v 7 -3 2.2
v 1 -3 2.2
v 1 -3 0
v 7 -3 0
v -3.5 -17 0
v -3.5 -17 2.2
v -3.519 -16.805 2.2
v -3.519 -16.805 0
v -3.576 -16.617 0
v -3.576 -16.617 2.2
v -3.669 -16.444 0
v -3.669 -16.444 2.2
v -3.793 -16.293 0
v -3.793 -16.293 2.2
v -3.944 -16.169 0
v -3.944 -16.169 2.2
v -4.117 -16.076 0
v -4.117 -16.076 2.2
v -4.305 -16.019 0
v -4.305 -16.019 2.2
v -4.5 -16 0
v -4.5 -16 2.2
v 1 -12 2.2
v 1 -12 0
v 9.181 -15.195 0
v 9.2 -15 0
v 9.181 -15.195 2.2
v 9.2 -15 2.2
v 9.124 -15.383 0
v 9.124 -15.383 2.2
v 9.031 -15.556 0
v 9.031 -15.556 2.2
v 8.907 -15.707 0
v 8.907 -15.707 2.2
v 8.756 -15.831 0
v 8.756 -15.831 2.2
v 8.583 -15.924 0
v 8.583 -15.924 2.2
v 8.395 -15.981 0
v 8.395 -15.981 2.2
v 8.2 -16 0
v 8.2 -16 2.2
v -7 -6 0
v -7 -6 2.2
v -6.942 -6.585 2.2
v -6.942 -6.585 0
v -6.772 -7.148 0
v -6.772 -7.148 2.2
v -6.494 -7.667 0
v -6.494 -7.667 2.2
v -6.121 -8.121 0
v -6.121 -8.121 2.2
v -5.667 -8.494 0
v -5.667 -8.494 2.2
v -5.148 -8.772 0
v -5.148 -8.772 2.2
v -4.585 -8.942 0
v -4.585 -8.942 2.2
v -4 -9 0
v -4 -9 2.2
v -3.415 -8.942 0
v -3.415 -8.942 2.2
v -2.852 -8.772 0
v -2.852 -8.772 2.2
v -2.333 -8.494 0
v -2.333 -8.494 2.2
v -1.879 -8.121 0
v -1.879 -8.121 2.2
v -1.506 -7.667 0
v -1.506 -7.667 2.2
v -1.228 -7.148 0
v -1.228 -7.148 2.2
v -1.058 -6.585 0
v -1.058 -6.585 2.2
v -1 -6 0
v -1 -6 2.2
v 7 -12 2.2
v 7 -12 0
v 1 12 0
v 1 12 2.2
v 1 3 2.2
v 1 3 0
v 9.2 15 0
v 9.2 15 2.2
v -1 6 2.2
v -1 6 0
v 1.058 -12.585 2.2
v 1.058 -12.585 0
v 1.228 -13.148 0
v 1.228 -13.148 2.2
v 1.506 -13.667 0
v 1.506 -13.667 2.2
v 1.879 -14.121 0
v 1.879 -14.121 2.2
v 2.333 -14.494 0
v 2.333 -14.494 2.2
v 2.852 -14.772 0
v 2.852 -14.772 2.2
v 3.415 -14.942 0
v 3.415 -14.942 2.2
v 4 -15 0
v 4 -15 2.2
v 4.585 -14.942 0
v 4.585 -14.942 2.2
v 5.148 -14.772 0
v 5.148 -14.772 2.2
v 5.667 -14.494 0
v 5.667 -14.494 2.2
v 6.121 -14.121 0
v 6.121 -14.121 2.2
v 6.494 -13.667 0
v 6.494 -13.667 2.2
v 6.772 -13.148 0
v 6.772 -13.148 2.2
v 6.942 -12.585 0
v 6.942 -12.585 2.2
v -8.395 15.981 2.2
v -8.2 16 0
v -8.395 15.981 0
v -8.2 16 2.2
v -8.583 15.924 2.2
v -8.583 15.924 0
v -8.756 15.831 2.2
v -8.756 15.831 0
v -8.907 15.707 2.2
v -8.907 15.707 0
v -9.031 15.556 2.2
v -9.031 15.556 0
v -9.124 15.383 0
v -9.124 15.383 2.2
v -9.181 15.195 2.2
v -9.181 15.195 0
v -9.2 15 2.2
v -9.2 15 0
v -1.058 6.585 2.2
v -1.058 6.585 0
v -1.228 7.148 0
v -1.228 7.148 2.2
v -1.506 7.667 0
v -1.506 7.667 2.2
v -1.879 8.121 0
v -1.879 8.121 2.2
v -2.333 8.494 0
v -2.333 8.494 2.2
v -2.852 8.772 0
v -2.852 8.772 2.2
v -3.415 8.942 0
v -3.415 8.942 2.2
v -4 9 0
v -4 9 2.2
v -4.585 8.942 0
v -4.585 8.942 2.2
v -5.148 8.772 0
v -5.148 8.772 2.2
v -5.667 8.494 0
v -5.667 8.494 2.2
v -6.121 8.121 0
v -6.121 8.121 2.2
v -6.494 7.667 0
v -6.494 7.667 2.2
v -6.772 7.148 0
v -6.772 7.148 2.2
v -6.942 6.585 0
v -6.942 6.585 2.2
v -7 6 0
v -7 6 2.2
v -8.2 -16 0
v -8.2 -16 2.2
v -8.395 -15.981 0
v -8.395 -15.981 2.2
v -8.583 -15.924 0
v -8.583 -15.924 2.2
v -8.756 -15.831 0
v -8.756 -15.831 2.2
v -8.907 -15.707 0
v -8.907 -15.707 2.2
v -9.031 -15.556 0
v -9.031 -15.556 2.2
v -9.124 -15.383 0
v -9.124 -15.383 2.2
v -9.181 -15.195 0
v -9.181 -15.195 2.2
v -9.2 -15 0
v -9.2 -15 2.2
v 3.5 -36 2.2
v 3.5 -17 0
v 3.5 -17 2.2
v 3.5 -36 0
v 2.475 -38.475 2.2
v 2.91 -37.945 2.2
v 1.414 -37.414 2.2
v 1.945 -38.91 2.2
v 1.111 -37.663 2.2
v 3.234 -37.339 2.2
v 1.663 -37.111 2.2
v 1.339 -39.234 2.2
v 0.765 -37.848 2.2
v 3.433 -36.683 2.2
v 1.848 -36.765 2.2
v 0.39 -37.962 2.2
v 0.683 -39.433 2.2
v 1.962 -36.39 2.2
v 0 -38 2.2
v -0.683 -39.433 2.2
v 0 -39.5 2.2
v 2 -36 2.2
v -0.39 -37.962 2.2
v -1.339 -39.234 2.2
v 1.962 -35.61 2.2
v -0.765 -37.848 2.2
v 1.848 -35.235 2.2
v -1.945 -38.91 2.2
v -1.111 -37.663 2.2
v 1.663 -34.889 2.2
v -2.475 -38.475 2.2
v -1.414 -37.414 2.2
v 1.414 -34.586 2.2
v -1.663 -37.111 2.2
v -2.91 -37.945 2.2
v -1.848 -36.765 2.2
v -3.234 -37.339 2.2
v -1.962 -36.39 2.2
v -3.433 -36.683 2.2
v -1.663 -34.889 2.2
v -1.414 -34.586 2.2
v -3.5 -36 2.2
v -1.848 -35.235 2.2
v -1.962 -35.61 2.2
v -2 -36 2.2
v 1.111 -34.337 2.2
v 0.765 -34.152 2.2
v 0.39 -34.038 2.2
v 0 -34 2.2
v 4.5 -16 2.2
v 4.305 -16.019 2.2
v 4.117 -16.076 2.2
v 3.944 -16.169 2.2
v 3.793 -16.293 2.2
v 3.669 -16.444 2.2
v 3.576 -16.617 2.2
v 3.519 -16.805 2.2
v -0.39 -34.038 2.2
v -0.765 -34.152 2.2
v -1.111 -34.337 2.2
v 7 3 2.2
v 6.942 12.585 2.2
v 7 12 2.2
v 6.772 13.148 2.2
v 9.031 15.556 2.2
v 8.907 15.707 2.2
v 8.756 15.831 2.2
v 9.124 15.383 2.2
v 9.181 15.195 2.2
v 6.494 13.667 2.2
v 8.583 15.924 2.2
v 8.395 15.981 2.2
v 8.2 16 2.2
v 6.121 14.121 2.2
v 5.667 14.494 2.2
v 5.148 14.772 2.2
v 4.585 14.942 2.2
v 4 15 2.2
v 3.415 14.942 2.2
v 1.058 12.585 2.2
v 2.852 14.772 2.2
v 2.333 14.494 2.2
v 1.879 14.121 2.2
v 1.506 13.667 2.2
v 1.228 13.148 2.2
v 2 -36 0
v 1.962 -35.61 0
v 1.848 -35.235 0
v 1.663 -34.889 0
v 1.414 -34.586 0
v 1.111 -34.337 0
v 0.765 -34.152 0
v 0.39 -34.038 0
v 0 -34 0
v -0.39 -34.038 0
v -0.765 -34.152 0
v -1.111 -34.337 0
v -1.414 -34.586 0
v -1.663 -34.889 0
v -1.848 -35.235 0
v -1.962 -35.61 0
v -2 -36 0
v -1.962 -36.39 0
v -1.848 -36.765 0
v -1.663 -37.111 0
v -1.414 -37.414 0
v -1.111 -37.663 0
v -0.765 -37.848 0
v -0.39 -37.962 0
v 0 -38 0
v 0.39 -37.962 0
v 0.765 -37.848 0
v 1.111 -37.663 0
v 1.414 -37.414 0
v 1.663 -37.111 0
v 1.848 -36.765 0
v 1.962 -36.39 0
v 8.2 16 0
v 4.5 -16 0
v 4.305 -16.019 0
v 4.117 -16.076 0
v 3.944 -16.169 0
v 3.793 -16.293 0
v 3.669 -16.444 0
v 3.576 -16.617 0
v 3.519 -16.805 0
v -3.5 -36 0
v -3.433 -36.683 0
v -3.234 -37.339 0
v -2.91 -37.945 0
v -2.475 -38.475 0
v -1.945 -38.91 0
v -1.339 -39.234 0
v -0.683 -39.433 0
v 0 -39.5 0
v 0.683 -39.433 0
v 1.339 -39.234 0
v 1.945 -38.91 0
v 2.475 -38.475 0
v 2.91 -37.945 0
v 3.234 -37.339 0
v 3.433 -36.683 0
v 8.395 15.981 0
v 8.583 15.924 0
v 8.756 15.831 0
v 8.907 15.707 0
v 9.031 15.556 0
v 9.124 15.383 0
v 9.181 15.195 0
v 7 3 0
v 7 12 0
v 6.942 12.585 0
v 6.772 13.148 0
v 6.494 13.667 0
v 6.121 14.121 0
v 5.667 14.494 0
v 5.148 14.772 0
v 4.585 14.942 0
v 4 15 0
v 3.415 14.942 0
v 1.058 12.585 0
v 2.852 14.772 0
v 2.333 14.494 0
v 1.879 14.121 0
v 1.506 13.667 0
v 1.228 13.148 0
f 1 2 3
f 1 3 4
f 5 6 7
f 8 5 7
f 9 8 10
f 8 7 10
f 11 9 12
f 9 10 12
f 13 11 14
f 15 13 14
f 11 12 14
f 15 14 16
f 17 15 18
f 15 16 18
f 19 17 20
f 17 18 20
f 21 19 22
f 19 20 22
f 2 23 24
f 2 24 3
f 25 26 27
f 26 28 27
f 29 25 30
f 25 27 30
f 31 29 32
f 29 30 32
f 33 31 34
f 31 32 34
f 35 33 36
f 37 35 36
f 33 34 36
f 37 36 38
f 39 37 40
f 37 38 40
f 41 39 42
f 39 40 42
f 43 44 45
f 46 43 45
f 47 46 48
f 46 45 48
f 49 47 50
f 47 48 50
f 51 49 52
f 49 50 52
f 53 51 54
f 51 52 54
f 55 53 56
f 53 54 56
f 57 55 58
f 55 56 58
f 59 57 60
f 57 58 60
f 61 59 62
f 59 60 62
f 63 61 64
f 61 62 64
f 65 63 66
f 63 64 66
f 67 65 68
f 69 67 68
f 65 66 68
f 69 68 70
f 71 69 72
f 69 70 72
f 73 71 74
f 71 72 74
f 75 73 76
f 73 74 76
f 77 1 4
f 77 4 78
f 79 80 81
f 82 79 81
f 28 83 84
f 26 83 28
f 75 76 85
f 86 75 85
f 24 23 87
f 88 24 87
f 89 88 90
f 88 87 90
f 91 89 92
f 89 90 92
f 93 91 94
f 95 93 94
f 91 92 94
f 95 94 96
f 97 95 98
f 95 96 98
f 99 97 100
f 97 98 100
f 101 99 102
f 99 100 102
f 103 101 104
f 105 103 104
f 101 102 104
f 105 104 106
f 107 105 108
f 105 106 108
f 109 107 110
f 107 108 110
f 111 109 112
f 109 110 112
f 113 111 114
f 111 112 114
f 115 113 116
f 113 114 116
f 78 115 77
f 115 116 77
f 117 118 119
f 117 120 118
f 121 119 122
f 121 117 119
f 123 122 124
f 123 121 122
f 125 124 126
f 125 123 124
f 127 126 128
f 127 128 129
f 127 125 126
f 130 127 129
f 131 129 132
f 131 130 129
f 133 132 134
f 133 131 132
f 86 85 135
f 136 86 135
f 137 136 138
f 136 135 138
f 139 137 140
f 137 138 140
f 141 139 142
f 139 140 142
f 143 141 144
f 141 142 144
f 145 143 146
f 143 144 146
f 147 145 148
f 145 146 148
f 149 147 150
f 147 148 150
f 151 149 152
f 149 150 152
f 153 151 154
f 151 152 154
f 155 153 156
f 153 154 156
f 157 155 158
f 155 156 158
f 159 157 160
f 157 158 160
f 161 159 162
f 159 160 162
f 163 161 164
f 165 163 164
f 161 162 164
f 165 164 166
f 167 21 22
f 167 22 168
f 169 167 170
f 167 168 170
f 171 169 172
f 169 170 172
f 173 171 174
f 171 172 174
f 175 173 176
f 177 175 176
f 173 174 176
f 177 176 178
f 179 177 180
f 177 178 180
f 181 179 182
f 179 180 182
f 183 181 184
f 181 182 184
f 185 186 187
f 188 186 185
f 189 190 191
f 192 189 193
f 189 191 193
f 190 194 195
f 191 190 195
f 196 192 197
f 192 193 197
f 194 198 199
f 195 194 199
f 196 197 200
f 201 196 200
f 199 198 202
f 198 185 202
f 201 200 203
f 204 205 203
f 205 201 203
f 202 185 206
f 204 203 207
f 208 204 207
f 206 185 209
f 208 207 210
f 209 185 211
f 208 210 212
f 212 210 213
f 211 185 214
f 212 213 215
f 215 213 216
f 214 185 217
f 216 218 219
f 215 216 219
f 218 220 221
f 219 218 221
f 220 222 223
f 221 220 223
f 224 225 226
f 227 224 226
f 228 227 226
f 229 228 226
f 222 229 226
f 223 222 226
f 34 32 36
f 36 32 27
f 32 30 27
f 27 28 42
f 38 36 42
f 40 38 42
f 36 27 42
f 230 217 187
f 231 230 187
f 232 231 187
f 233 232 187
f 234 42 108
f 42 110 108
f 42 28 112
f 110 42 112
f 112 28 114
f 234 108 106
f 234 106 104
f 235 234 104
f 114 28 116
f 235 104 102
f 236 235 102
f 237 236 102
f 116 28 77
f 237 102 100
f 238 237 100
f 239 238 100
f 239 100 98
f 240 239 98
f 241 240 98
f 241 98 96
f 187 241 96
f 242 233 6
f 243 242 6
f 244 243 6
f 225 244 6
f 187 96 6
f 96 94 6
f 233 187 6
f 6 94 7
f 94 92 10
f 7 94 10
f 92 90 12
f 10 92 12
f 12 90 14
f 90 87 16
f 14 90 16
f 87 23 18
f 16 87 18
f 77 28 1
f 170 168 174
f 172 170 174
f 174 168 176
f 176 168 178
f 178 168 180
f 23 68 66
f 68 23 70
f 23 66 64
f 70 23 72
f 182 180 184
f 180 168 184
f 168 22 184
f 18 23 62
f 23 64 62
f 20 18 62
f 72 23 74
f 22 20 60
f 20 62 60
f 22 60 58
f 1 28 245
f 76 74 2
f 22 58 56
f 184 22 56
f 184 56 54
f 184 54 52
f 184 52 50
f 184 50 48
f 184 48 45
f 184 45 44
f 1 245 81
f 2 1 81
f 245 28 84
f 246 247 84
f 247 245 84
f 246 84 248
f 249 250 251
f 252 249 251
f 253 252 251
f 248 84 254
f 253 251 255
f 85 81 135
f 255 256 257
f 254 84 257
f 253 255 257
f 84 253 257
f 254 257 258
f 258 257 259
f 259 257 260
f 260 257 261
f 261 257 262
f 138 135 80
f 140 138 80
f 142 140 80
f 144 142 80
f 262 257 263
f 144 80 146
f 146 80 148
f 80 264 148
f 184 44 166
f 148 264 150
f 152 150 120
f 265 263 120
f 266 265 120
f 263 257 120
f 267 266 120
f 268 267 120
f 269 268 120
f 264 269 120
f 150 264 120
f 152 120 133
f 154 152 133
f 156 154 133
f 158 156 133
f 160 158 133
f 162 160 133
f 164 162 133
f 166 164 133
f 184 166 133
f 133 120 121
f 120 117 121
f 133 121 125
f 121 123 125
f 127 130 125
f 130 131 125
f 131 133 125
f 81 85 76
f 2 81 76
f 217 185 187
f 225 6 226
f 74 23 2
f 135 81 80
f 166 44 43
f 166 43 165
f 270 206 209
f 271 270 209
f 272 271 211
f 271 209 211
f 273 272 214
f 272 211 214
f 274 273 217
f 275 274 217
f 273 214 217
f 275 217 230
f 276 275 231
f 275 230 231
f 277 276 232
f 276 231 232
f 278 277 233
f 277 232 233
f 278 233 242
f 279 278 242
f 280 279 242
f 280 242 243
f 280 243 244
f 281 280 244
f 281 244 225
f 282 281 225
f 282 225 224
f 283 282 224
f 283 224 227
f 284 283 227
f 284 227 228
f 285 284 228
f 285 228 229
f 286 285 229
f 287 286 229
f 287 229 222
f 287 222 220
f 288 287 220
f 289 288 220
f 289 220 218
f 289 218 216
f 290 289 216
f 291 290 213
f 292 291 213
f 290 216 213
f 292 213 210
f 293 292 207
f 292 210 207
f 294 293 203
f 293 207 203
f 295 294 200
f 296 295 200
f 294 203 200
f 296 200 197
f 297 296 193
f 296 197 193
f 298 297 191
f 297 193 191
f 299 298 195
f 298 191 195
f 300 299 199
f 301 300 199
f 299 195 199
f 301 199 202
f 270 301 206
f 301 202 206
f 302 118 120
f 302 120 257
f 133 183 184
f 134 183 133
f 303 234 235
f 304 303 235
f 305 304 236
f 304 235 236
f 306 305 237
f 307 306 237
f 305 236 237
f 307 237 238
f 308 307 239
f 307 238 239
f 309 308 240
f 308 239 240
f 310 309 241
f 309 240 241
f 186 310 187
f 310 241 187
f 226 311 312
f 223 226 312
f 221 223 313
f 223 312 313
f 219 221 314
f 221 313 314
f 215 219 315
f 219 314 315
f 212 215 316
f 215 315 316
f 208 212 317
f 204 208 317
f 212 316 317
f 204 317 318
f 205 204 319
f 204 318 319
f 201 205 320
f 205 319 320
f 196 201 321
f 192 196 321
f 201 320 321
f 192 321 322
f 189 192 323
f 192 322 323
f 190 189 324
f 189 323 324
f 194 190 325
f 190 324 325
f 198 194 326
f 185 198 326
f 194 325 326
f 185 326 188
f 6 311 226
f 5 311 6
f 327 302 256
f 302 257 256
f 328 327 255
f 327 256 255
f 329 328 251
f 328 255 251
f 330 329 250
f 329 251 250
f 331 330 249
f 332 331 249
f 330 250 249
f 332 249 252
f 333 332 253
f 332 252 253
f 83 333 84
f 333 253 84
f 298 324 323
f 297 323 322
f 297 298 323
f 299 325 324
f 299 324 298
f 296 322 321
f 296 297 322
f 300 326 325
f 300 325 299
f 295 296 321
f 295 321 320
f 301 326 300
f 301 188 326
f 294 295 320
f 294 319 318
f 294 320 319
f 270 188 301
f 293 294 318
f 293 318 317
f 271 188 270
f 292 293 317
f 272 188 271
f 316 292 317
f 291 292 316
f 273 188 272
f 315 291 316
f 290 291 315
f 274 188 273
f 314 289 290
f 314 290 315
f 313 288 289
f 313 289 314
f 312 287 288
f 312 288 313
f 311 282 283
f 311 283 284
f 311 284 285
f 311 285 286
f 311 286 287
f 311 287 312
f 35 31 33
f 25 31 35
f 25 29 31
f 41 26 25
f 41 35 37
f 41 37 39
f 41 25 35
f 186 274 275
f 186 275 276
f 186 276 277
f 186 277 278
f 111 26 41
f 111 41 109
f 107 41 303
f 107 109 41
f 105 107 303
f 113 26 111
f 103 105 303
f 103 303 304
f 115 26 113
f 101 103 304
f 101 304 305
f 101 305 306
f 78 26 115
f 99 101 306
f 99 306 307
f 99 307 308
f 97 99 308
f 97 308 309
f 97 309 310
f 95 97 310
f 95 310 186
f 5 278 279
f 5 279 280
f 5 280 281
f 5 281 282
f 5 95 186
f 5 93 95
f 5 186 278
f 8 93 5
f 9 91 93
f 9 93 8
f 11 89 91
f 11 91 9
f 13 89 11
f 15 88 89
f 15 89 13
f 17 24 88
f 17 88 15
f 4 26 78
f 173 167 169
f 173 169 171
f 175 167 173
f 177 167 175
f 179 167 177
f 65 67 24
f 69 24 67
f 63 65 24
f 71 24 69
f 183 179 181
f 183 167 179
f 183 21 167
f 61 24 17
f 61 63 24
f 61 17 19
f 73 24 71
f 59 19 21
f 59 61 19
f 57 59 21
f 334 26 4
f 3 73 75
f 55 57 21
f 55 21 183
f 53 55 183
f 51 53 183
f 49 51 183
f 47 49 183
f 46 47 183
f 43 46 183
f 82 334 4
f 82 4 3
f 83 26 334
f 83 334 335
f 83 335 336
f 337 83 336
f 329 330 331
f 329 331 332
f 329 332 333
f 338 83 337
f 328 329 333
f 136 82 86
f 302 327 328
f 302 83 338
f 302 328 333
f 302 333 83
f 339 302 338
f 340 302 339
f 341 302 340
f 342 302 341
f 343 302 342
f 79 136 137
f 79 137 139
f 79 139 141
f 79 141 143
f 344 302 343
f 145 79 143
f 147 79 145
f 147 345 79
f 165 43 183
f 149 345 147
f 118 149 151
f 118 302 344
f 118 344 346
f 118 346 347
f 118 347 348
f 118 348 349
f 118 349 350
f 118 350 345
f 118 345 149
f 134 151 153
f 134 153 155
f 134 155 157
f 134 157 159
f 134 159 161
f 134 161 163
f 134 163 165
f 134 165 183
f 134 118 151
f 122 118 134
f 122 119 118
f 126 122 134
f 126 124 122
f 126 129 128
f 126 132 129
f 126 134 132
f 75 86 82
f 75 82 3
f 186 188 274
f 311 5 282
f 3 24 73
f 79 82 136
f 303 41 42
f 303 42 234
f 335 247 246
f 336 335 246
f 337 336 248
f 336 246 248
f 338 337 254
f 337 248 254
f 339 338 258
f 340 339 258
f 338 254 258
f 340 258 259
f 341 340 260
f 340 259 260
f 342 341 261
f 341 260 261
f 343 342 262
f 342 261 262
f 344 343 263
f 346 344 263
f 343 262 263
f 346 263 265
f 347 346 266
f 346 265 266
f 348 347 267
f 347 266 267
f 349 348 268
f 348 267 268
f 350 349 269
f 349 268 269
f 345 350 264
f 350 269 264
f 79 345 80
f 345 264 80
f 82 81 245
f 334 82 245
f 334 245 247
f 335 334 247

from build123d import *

# Parameters (mm, degrees)
PAD_DEPTH     = 2.2
FILLET_R      = 1
SKETCH001_R   = 2
SKETCH001_R_2 = 1
POCKET_DEPTH  = 5


with BuildPart() as part:
    # Sketch → Pad (new body)
    with BuildSketch(Plane.XY):
        with BuildLine():
            Line((-9.2, 16), (9.2, 16))
            Line((9.2, 16), (9.2, -16))
            Line((9.2, -16), (4.5, -16))
            Line((4.5, -16), (4.5, -17))
            Line((4.5, -17), (3.5, -17))
            Line((3.5, -17), (3.5, -36))
            ThreePointArc((-3.5, -36), (0, -39.500021), (3.5, -36))
            Line((-3.5, -36), (-3.5, -17))
            Line((-3.5, -17), (-4.5, -17))
            Line((-4.5, -17), (-4.5, -16))
            Line((-4.5, -16), (-9.2, -16))
            Line((-9.2, -16), (-9.2, 16))
        make_face()
    extrude(amount=PAD_DEPTH)

    # Fillet
    fillet_edges = [part.edges().sort_by_distance(p)[0] for p in [
        (-9.2, 16, 1.1),
        (9.2, 16, 1.1),
        (9.2, -16, 1.1),
        (-9.2, -16, 1.1),
    ]]
    fillet(fillet_edges, radius=FILLET_R)

    # Sketch001 (on DatumPlane) → Pocket (cut)
    with BuildSketch(Plane.XY.offset(2.2)):
        with Locations((0, -36)):
            Circle(SKETCH001_R)
        with Locations((-4.5, -17)):
            Circle(SKETCH001_R_2)
        with Locations((4.5, -17)):
            Circle(SKETCH001_R_2)
        with BuildLine():
            ThreePointArc((-1, 6.00001), (-4.000005, 9.000001), (-7, 6))
            Line((-7, -6), (-7, 6))
            ThreePointArc((-7, -6), (-3.999995, -8.999997), (-1, -5.99999))
            Line((-1, -5.99999), (-1, 6.00001))
        make_face()
        with BuildLine():
            Line((1, 12), (1, 3))
            Line((1, 3), (7, 3))
            Line((7, 3), (7, 12))
            ThreePointArc((7, 12), (4, 15), (1, 12))
        make_face()
        with BuildLine():
            Line((1, -12), (1, -3))
            Line((1, -3), (7, -3))
            Line((7, -3), (7, -12))
            ThreePointArc((1, -12), (4, -15), (7, -12))
        make_face()
    extrude(amount=-POCKET_DEPTH, mode=Mode.SUBTRACT)


solid = part.part
